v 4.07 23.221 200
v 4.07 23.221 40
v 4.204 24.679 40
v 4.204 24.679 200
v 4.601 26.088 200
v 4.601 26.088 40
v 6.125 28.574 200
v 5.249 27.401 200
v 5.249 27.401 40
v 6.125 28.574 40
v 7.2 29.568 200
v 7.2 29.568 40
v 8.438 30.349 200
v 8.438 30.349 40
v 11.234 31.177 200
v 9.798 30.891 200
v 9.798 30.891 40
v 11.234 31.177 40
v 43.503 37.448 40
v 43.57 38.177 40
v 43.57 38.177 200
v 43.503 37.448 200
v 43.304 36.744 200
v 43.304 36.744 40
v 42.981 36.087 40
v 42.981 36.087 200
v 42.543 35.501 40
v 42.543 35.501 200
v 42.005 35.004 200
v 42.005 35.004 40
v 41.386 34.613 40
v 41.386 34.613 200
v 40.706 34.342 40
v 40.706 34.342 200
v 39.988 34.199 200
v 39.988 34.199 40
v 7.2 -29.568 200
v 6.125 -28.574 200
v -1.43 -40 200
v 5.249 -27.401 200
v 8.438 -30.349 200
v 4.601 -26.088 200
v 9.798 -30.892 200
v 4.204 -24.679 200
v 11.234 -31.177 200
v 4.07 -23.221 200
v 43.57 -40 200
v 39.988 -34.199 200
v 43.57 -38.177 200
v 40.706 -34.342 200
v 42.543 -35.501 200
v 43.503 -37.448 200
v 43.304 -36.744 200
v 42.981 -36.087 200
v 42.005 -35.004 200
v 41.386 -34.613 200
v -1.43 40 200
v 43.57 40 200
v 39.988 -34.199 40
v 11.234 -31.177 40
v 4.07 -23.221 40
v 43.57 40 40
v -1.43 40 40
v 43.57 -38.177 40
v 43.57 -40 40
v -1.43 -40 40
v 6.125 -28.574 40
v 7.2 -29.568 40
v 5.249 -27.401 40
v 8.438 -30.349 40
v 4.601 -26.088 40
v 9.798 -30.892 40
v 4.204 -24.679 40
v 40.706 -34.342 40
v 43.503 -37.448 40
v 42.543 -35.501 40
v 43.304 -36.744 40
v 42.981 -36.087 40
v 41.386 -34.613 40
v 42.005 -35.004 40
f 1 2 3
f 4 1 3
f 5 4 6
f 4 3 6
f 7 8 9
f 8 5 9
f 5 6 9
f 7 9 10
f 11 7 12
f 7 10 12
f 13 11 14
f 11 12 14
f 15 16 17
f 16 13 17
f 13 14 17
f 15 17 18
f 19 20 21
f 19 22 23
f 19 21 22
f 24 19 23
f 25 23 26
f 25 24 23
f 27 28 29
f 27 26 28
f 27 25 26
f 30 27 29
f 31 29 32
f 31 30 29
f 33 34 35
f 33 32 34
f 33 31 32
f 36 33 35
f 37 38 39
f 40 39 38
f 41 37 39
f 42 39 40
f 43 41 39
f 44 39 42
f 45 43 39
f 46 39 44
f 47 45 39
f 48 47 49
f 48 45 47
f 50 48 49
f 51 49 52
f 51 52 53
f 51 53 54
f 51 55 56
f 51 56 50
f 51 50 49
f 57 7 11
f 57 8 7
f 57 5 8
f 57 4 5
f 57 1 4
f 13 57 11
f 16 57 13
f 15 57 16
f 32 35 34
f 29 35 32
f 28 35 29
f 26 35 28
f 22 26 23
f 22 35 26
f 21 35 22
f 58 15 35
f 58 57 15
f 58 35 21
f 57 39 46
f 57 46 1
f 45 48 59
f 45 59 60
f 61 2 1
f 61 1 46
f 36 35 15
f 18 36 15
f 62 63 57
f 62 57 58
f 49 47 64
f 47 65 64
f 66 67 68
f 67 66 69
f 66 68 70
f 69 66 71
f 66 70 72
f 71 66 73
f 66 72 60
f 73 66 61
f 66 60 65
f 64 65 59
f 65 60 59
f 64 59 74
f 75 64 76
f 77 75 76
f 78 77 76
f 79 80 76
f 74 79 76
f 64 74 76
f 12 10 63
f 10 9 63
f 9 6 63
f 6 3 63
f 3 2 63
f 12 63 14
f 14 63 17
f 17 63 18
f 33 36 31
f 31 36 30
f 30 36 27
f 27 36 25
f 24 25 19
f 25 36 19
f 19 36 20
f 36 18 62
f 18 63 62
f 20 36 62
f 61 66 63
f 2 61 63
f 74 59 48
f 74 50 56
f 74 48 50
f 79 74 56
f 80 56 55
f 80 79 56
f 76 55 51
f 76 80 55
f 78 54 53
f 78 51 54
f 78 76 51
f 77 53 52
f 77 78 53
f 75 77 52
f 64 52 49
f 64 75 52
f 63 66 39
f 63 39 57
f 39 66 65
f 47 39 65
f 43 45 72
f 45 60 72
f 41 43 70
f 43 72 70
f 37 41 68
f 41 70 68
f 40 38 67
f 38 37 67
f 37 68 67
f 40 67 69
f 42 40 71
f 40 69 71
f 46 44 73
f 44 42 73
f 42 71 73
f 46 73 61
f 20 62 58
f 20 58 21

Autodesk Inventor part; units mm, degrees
ref_plane "Начальная плоскость" through (0, 0, 40) normal (0, 0, 1) x (1, 0, 0)
ref_plane "Конечная плоскость" through (0, 0, 200) normal (0, 0, 1) x (1, 0, 0)
sketch "Эскиз" plane through (0, 0, 0) normal (0, 0, 1) x (1, 0, 0)
  line L0 (-1.43, 0) -> (-1.43, 40)
  line L1 (-1.43, 40) -> (43.57, 40)
  line L2 (43.57, 40) -> (43.57, 38.1774)
  line L3 (39.9881, 34.1993) -> (11.2338, 31.1771)
  line L4 (4.07, 23.221) -> (4.07, 0)
  line L5 (4.07, 0) -> (-1.43, 0) construction
  line L6 (23.82, 40) -> (23.82, 32.5) construction
  line L7 (43.57, 34.5758) -> (43.57, 32.5) construction
  line L8 (43.57, 32.5) -> (23.82, 32.5) construction
  line L9 (0, 15) -> (0, -27) construction
  line L10 (-5.539, 0) -> (16.0067, 0) construction
  line L11 (-1.43, 0) -> (-1.43, -40)
  line L12 (-1.43, -40) -> (43.57, -40)
  line L13 (43.57, -40) -> (43.57, -38.1774)
  line L14 (39.9881, -34.1993) -> (11.2338, -31.1771)
  line L15 (4.07, -23.221) -> (4.07, 0)
  arc A0 (11.2338, 31.1771) -> (4.07, 23.221) centre (12.07, 23.221) ccw
  arc A1 (4.07, -23.221) -> (11.2338, -31.1771) centre (12.07, -23.221) ccw
  arc A2 (39.9881, 34.1993) -> (43.57, 38.1774) centre (39.57, 38.1774) ccw
  arc A3 (43.57, -38.1774) -> (39.9881, -34.1993) centre (39.57, -38.1774) ccw
  line L16 (0, 56) -> (0, -56) construction
  line L17 (-15.5135, 0) -> (54.308, 0) construction
  point P0 (4.07, 30.4242)
  point P1 (43.57, -34.5758)
  point P2 (4.07, -30.4242)
  point P3 (23.82, -40)
  point P4 (23.82, -32.5)
  dimension "d0" = 5.5
  dimension "d1" = 40
  dimension "d2" = 45
  dimension "d3" = 7.5
  dimension "d4" = 19.75
  dimension "d5" = 2.0758
  dimension "d23" = 8
  dimension "d24" = 4
  dimension "d25" = 1.43
extrude "Тело" add sketch "Эскиз" along normal up to surface (160 mm away) from surface at 40
sketch "Sketch3" plane through (0, 0, 0) normal (0, 0, 1) x (1, 0, 0)
  line L0 (0, 0) -> (10, 0)
ref_plane "Work Plane3" through (0, 0, 0) normal (0, -1, 0) x (1, 0, 0)
sketch "Sketch4" plane through (0, 0, 0) normal (0, -1, 0) x (1, 0, 0)
  line L0 (-2, 40) -> (12, 40)
  line L1 (-2, 200) -> (12, 200)
  dimension "d29" = 160
ref_plane "РабПлоскость4" through (43.57, 295, 200) normal (0, 0, 1) x (1, 0, 0)
split "Разделение1" plane through (43.57, 295, 200) removes the side toward (0, 0, 1)
ref_plane "РабПлоскость5" through (43.57, -375, 40) normal (0, 0, -1) x (-1, 0, 0)
split "Разделение2" plane through (43.57, -375, 40) removes the side toward (0, 0, -1)
equation "\"d0\" = G_T"
equation "\"d1\" = 0.5 * G_H"
equation "\"d2\" = G_W"
equation "\"d3\" = G_T1"
equation "\"d4\" = G_C"
equation "\"d23\" = G_IR"
equation "\"d24\" = G_ER"
equation "\"d25\" = ex"
equation "\"d6\" = G_L"
equation "\"G_W\" = 45"
equation "\"G_T\" = 5.5"
equation "\"G_T1\" = 7.5"
equation "\"G_NG\" = 0.105104"
equation "\"G_ER\" = 4"
equation "\"G_IR\" = 8"
equation "\"G_C\" = 19.75"
equation "\"G_L\" = d29"
equation "\"ex\" = 1.43"
equation "\"G_H\" = 80"
properties part number "ISO 657/11 - CH 80 x 8 - 160" material "Сталь, мягкая"
